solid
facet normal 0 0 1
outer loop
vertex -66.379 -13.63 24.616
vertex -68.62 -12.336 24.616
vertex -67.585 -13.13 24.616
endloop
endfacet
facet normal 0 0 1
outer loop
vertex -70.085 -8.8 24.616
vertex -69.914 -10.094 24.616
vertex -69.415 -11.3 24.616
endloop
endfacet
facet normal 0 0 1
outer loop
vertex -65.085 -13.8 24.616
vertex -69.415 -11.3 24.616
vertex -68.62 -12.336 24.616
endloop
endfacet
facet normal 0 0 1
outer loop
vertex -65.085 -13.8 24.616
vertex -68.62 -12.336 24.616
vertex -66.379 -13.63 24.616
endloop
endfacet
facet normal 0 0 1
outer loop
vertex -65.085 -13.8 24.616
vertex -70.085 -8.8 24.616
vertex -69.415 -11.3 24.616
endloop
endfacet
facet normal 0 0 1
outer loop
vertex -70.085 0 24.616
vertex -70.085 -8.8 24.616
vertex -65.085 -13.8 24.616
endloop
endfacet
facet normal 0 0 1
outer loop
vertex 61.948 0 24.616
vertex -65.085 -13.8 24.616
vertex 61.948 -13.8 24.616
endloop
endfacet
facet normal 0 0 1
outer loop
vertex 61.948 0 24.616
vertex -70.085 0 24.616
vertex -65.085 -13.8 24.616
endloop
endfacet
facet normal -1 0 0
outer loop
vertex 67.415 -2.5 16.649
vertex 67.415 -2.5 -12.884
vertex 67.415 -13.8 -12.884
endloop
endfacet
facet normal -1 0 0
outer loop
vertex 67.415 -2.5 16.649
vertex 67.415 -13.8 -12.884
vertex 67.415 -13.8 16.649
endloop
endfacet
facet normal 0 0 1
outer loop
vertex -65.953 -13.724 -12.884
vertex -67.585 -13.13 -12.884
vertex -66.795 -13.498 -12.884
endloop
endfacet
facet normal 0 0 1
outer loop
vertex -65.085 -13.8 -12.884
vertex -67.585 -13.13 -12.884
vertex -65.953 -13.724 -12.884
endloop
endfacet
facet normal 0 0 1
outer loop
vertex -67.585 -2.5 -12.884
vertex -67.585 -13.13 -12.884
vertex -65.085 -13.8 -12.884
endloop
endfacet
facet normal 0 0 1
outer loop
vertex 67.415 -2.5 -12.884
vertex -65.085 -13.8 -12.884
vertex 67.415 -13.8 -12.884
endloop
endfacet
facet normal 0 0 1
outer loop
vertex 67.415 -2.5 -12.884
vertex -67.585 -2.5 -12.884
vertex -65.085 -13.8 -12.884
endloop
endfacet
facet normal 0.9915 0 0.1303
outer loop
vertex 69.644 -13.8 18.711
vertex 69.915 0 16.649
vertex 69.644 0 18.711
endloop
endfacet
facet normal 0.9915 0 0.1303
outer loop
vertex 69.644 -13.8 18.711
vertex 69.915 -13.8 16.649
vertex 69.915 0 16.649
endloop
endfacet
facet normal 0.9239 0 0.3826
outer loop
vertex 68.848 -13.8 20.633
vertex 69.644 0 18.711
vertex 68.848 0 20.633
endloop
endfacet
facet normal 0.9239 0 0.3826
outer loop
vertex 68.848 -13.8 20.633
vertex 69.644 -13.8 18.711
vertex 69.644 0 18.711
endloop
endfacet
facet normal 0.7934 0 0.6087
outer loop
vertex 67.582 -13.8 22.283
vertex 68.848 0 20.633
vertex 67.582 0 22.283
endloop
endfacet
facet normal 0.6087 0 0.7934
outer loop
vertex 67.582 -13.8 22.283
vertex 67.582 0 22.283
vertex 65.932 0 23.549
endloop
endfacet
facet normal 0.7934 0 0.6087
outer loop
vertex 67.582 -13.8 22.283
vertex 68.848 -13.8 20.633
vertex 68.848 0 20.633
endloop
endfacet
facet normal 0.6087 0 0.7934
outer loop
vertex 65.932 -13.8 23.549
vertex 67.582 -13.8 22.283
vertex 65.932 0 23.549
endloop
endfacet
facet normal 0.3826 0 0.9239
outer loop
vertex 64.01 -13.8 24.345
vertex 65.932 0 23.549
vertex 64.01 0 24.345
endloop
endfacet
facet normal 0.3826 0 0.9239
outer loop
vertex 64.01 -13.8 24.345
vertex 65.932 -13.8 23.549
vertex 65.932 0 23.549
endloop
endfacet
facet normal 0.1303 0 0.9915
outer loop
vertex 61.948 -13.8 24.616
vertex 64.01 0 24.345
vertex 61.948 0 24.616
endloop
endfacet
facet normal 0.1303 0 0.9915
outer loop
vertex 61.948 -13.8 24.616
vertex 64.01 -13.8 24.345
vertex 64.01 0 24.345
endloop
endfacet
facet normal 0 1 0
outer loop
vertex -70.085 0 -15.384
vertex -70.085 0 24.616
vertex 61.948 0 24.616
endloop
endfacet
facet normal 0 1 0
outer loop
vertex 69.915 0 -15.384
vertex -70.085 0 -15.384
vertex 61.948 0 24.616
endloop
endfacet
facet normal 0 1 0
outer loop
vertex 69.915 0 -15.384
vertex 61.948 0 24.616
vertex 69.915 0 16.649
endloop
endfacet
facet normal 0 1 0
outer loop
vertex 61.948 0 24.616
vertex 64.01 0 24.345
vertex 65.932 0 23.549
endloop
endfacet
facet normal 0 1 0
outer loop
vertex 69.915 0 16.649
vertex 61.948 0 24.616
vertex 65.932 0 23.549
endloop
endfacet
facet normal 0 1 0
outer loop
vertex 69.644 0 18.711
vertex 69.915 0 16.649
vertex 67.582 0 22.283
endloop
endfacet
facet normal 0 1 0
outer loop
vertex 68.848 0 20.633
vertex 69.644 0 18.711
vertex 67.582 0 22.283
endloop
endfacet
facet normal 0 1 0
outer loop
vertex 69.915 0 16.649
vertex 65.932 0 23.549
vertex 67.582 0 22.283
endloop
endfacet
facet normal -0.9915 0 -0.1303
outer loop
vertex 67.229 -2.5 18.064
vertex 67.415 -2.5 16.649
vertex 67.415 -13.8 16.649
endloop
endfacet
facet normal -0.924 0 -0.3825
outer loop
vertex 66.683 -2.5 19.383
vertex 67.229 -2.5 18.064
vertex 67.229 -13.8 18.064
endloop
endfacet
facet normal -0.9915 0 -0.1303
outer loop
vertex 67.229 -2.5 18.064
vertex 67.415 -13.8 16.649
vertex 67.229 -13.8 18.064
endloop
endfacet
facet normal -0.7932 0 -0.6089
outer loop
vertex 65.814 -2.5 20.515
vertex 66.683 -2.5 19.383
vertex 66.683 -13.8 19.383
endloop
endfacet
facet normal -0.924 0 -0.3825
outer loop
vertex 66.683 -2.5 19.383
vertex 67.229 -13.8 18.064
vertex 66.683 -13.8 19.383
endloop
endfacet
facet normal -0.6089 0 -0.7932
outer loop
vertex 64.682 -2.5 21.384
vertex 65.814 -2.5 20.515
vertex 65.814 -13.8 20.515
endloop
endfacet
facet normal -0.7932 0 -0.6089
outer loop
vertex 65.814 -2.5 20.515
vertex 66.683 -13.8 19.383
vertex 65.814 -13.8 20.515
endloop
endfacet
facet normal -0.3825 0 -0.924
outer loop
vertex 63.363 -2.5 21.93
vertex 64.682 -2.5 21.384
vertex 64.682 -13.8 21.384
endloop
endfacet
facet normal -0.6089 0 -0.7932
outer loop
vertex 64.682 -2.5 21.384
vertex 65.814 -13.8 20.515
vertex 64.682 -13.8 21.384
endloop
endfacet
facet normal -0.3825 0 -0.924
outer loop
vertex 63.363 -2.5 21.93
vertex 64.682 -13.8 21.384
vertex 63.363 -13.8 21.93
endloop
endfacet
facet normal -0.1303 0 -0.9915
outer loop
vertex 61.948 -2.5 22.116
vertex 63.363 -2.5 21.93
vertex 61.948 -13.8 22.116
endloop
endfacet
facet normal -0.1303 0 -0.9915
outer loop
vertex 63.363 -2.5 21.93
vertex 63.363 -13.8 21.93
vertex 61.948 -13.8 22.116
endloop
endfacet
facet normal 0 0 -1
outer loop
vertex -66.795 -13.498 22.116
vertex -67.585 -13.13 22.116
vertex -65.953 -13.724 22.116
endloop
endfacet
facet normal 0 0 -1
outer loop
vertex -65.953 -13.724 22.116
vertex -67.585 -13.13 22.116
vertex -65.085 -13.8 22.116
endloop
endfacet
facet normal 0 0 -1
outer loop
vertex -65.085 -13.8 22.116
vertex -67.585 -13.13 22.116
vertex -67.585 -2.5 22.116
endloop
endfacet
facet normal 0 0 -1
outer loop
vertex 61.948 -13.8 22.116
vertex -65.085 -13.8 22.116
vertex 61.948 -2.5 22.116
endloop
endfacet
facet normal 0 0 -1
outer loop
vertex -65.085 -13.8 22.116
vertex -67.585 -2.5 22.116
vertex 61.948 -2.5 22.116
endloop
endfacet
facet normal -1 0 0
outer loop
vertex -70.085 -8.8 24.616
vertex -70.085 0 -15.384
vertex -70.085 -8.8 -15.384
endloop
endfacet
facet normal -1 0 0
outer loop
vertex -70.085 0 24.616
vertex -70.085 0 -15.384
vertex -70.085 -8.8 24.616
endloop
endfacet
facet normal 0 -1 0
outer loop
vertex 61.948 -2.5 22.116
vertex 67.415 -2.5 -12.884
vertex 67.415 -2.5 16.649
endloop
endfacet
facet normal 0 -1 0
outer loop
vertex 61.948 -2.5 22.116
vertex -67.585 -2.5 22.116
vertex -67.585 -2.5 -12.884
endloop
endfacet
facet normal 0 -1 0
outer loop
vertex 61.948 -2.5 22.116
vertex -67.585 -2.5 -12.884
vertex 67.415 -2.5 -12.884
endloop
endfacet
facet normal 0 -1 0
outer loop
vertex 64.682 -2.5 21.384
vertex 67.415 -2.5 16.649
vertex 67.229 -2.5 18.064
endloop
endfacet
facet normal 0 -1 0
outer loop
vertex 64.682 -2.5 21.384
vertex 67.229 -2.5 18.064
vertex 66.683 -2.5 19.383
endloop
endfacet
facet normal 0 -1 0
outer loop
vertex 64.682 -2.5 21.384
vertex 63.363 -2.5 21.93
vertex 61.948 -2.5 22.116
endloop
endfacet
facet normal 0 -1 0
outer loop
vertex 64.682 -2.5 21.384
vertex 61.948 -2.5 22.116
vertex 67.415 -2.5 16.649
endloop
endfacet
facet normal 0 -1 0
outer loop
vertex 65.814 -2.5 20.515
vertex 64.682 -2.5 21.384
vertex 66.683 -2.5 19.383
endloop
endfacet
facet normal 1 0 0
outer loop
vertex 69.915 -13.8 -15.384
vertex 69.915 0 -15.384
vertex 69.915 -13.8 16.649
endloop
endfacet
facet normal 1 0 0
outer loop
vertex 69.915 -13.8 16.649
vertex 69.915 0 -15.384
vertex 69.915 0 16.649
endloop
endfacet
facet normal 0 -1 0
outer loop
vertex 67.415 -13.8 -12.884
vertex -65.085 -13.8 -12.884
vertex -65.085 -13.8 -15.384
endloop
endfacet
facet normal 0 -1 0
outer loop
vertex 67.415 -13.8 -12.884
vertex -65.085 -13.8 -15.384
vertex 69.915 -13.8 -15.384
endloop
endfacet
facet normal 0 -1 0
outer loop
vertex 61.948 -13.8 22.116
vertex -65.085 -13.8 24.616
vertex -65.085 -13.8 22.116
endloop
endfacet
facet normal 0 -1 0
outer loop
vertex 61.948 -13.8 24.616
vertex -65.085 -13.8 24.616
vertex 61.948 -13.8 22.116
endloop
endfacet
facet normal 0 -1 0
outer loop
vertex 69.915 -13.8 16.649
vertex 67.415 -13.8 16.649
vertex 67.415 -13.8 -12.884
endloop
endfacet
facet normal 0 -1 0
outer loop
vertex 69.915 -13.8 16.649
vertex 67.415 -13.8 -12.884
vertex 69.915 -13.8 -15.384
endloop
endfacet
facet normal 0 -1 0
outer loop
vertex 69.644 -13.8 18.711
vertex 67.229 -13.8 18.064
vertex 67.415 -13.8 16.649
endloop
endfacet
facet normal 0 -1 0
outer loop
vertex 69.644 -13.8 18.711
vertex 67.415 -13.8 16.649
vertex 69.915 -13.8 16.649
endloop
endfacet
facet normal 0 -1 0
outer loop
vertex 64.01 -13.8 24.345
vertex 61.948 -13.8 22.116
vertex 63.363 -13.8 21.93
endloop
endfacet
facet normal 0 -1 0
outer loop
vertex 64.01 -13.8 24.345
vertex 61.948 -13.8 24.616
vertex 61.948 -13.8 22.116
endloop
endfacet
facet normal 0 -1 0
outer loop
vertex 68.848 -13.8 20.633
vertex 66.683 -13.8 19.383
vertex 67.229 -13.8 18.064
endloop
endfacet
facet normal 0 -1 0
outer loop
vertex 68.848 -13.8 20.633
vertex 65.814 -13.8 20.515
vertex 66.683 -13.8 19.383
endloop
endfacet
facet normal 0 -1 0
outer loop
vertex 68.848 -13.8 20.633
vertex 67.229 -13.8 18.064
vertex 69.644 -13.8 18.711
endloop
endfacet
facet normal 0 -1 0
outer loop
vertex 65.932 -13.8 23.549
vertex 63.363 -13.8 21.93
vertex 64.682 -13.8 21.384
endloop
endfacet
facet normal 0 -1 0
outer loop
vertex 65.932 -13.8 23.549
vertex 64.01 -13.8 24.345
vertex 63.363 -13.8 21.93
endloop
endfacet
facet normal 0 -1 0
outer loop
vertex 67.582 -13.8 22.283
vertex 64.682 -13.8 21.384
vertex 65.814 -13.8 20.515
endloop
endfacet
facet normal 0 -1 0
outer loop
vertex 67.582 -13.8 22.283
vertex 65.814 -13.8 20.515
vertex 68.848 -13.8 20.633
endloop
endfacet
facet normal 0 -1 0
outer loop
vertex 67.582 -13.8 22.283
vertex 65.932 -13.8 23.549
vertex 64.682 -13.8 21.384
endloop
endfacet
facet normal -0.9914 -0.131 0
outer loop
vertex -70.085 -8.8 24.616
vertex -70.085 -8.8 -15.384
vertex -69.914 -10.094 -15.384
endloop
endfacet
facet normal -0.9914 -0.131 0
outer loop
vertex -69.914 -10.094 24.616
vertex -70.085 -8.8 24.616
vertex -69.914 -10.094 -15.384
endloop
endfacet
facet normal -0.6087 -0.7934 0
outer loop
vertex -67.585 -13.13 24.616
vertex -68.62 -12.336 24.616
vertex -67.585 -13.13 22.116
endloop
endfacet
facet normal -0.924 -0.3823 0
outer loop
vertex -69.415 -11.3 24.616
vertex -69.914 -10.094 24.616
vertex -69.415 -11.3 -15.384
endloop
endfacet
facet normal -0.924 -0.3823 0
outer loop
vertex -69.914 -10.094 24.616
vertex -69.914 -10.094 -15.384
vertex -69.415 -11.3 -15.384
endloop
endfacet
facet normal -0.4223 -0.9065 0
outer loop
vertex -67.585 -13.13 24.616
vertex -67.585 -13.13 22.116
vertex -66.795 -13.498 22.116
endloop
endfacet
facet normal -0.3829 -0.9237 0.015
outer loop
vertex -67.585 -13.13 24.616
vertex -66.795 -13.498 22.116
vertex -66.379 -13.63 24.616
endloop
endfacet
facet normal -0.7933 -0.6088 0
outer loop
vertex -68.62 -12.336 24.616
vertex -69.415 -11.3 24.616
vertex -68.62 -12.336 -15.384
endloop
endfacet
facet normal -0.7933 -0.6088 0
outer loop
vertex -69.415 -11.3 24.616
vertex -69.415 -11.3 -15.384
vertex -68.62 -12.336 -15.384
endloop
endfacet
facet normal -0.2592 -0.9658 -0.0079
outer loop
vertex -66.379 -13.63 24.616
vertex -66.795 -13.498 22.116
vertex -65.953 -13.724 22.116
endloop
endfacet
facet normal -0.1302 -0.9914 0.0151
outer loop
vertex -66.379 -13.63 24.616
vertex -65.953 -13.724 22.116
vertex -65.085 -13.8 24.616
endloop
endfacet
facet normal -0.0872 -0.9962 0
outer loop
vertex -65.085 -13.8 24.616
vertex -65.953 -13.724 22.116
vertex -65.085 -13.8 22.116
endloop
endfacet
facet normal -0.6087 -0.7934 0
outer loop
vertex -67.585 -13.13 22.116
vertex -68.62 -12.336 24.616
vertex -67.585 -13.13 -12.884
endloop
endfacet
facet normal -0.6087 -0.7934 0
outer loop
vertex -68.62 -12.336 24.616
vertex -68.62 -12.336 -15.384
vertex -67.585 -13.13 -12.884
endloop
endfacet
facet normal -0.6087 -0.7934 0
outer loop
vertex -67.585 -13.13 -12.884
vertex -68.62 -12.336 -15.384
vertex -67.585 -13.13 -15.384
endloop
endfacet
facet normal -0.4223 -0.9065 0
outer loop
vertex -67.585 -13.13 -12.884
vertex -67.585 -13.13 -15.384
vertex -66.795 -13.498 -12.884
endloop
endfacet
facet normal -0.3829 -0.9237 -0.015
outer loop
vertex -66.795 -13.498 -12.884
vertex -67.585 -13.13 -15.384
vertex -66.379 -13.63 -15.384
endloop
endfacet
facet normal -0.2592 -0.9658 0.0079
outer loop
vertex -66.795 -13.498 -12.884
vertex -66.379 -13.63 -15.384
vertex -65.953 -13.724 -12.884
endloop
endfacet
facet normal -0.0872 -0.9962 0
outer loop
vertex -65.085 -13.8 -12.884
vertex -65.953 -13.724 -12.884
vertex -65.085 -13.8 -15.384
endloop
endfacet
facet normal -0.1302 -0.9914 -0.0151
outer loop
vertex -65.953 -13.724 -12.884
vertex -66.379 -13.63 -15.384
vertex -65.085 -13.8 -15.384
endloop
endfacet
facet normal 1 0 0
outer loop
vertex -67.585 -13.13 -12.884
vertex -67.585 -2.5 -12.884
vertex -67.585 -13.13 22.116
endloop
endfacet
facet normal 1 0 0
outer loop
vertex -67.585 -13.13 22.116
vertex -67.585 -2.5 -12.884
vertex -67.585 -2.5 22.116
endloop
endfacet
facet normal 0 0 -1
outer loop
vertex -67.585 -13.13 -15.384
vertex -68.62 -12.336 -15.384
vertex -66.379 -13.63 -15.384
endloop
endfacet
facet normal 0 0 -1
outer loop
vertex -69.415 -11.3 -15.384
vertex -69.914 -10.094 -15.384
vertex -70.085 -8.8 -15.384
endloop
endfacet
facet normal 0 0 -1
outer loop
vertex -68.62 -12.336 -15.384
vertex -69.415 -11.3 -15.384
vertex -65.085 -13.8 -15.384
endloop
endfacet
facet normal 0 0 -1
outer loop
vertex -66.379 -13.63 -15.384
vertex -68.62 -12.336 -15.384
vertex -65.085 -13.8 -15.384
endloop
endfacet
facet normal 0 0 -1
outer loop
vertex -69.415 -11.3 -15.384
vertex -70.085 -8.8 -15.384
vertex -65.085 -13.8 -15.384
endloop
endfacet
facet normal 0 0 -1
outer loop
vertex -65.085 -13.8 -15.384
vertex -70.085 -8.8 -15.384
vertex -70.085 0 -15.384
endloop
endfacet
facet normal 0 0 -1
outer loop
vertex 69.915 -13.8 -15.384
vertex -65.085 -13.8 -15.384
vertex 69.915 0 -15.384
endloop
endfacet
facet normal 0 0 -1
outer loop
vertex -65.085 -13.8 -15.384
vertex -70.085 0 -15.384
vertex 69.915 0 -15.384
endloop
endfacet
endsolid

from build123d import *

# Parameters (mm, degrees)
F0_W        = 140
F0_H        = 40
F1_DEPTH    = 13.8
F2_R        = 7.9669047558
F3_T        = -2.5
F4_T1_DEPTH = 65


# Not quite as in the source:
# - a fillet or chamfer that OpenCascade refuses, or shapes differently, is made with other operations: its cross-section is extruded or revolved along the edge and cut away or added


with BuildPart() as f1:
    # F0 (on Front) → F1 (new body)
    with BuildSketch(Plane.XZ):
        with Locations((-0.0846795738, 4.6162967879)):
            Rectangle(F0_W, F0_H)
    extrude(amount=F1_DEPTH)

    # F2
    f2_edges = [f1.edges().sort_by_distance(p)[0] for p in [
        (69.91532, -6.9, 24.616297),
    ]]
    fillet(f2_edges, radius=F2_R)

    # F3
    f3_openings = [f1.faces().sort_by_distance(p)[0] for p in [
        (-0.25102, -13.8, 4.57187),
    ]]
    offset(amount=F3_T, openings=f3_openings)

    # F4: fillet of radius 5 on 1 edges, made by hand

    # F4_s2 → F4_t1 (cut)
    with BuildSketch(Plane.XY.offset(-27.8837032121)):
        with BuildLine():
            ThreePointArc((-70.0846795738, -8.8), (-68.6202134797, -12.3355339059), (-65.0846795738, -13.8))
            Line((-65.0846795738, -13.8), (-70.0846795738, -13.8))
            Line((-70.0846795738, -13.8), (-70.0846795738, -8.8))
        make_face()
    extrude(amount=F4_T1_DEPTH, mode=Mode.SUBTRACT)


solid = f1.part
